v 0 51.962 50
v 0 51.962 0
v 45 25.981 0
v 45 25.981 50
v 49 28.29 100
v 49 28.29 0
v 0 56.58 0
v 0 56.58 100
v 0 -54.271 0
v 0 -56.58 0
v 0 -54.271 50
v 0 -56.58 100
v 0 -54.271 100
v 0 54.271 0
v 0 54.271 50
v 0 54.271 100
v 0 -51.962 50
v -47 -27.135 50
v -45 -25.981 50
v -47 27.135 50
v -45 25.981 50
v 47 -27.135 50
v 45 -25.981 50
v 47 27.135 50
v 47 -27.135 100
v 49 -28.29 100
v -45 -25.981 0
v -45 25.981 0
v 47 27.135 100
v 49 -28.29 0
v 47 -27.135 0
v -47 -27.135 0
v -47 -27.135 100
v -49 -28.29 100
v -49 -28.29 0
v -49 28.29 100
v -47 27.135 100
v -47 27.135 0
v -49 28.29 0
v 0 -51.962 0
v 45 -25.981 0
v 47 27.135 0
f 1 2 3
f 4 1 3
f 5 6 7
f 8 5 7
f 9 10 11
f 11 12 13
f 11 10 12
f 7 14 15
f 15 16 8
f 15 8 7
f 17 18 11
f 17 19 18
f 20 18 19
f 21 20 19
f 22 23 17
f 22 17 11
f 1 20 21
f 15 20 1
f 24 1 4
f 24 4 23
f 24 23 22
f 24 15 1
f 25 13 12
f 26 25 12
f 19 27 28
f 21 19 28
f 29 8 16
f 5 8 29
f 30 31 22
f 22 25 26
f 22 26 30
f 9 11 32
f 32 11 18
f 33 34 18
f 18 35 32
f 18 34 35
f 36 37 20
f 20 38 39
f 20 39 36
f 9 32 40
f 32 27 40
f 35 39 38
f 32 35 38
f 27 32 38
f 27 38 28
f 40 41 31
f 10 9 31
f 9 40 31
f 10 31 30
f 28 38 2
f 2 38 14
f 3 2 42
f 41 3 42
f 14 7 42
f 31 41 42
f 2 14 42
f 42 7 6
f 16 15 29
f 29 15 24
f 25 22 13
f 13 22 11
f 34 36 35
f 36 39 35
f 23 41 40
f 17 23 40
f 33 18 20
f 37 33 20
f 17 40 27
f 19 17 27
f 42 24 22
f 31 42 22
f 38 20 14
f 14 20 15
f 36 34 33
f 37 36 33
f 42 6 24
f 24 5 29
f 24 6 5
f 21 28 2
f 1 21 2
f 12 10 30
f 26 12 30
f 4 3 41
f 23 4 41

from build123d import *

# Parameters (mm, degrees)
F1_DEPTH = 50
F3_DEPTH = 50.001
F5_DEPTH = 50


with BuildPart() as f1:
    # F0 (on Top) → F1 (new body)
    with BuildSketch(Plane.XY):
        Polygon((-49, 28.290163), (-49, -28.290163), (0, -56.580326), (49, -28.290163), (49, 28.290163), (0, 56.580326), align=None)
        Polygon((0, -51.961524), (-45, -25.980762), (-45, 25.980762), (0, 51.961524), (45, 25.980762), (45, -25.980762), align=None, mode=Mode.SUBTRACT)
    extrude(amount=F1_DEPTH)

    # F2 (on face) → F3 (cut, through all)
    with BuildSketch(Plane.XY.offset(50)):
        Polygon((0, 56.580326), (-49, 28.290163), (-47, 27.135463), (0, 54.270925), align=None)
        Polygon((49, -28.290163), (49, 28.290163), (47, 27.135463), (47, -27.135463), align=None)
        Polygon((-47, -27.135463), (-49, -28.290163), (0, -56.580326), (0, -54.270925), align=None)
    extrude(amount=-F3_DEPTH, mode=Mode.SUBTRACT)

    # F4 (on face) → F5 (join)
    with BuildSketch(Plane.XY.offset(50)):
        Polygon((-47, 27.135463), (-49, 28.290163), (-49, -28.290163), (-47, -27.135463), align=None)
        Polygon((49, 28.290163), (0, 56.580326), (0, 54.270925), (47, 27.135463), align=None)
        Polygon((0, -54.270925), (0, -56.580326), (49, -28.290163), (47, -27.135463), align=None)
    extrude(amount=F5_DEPTH)


solid = f1.part
